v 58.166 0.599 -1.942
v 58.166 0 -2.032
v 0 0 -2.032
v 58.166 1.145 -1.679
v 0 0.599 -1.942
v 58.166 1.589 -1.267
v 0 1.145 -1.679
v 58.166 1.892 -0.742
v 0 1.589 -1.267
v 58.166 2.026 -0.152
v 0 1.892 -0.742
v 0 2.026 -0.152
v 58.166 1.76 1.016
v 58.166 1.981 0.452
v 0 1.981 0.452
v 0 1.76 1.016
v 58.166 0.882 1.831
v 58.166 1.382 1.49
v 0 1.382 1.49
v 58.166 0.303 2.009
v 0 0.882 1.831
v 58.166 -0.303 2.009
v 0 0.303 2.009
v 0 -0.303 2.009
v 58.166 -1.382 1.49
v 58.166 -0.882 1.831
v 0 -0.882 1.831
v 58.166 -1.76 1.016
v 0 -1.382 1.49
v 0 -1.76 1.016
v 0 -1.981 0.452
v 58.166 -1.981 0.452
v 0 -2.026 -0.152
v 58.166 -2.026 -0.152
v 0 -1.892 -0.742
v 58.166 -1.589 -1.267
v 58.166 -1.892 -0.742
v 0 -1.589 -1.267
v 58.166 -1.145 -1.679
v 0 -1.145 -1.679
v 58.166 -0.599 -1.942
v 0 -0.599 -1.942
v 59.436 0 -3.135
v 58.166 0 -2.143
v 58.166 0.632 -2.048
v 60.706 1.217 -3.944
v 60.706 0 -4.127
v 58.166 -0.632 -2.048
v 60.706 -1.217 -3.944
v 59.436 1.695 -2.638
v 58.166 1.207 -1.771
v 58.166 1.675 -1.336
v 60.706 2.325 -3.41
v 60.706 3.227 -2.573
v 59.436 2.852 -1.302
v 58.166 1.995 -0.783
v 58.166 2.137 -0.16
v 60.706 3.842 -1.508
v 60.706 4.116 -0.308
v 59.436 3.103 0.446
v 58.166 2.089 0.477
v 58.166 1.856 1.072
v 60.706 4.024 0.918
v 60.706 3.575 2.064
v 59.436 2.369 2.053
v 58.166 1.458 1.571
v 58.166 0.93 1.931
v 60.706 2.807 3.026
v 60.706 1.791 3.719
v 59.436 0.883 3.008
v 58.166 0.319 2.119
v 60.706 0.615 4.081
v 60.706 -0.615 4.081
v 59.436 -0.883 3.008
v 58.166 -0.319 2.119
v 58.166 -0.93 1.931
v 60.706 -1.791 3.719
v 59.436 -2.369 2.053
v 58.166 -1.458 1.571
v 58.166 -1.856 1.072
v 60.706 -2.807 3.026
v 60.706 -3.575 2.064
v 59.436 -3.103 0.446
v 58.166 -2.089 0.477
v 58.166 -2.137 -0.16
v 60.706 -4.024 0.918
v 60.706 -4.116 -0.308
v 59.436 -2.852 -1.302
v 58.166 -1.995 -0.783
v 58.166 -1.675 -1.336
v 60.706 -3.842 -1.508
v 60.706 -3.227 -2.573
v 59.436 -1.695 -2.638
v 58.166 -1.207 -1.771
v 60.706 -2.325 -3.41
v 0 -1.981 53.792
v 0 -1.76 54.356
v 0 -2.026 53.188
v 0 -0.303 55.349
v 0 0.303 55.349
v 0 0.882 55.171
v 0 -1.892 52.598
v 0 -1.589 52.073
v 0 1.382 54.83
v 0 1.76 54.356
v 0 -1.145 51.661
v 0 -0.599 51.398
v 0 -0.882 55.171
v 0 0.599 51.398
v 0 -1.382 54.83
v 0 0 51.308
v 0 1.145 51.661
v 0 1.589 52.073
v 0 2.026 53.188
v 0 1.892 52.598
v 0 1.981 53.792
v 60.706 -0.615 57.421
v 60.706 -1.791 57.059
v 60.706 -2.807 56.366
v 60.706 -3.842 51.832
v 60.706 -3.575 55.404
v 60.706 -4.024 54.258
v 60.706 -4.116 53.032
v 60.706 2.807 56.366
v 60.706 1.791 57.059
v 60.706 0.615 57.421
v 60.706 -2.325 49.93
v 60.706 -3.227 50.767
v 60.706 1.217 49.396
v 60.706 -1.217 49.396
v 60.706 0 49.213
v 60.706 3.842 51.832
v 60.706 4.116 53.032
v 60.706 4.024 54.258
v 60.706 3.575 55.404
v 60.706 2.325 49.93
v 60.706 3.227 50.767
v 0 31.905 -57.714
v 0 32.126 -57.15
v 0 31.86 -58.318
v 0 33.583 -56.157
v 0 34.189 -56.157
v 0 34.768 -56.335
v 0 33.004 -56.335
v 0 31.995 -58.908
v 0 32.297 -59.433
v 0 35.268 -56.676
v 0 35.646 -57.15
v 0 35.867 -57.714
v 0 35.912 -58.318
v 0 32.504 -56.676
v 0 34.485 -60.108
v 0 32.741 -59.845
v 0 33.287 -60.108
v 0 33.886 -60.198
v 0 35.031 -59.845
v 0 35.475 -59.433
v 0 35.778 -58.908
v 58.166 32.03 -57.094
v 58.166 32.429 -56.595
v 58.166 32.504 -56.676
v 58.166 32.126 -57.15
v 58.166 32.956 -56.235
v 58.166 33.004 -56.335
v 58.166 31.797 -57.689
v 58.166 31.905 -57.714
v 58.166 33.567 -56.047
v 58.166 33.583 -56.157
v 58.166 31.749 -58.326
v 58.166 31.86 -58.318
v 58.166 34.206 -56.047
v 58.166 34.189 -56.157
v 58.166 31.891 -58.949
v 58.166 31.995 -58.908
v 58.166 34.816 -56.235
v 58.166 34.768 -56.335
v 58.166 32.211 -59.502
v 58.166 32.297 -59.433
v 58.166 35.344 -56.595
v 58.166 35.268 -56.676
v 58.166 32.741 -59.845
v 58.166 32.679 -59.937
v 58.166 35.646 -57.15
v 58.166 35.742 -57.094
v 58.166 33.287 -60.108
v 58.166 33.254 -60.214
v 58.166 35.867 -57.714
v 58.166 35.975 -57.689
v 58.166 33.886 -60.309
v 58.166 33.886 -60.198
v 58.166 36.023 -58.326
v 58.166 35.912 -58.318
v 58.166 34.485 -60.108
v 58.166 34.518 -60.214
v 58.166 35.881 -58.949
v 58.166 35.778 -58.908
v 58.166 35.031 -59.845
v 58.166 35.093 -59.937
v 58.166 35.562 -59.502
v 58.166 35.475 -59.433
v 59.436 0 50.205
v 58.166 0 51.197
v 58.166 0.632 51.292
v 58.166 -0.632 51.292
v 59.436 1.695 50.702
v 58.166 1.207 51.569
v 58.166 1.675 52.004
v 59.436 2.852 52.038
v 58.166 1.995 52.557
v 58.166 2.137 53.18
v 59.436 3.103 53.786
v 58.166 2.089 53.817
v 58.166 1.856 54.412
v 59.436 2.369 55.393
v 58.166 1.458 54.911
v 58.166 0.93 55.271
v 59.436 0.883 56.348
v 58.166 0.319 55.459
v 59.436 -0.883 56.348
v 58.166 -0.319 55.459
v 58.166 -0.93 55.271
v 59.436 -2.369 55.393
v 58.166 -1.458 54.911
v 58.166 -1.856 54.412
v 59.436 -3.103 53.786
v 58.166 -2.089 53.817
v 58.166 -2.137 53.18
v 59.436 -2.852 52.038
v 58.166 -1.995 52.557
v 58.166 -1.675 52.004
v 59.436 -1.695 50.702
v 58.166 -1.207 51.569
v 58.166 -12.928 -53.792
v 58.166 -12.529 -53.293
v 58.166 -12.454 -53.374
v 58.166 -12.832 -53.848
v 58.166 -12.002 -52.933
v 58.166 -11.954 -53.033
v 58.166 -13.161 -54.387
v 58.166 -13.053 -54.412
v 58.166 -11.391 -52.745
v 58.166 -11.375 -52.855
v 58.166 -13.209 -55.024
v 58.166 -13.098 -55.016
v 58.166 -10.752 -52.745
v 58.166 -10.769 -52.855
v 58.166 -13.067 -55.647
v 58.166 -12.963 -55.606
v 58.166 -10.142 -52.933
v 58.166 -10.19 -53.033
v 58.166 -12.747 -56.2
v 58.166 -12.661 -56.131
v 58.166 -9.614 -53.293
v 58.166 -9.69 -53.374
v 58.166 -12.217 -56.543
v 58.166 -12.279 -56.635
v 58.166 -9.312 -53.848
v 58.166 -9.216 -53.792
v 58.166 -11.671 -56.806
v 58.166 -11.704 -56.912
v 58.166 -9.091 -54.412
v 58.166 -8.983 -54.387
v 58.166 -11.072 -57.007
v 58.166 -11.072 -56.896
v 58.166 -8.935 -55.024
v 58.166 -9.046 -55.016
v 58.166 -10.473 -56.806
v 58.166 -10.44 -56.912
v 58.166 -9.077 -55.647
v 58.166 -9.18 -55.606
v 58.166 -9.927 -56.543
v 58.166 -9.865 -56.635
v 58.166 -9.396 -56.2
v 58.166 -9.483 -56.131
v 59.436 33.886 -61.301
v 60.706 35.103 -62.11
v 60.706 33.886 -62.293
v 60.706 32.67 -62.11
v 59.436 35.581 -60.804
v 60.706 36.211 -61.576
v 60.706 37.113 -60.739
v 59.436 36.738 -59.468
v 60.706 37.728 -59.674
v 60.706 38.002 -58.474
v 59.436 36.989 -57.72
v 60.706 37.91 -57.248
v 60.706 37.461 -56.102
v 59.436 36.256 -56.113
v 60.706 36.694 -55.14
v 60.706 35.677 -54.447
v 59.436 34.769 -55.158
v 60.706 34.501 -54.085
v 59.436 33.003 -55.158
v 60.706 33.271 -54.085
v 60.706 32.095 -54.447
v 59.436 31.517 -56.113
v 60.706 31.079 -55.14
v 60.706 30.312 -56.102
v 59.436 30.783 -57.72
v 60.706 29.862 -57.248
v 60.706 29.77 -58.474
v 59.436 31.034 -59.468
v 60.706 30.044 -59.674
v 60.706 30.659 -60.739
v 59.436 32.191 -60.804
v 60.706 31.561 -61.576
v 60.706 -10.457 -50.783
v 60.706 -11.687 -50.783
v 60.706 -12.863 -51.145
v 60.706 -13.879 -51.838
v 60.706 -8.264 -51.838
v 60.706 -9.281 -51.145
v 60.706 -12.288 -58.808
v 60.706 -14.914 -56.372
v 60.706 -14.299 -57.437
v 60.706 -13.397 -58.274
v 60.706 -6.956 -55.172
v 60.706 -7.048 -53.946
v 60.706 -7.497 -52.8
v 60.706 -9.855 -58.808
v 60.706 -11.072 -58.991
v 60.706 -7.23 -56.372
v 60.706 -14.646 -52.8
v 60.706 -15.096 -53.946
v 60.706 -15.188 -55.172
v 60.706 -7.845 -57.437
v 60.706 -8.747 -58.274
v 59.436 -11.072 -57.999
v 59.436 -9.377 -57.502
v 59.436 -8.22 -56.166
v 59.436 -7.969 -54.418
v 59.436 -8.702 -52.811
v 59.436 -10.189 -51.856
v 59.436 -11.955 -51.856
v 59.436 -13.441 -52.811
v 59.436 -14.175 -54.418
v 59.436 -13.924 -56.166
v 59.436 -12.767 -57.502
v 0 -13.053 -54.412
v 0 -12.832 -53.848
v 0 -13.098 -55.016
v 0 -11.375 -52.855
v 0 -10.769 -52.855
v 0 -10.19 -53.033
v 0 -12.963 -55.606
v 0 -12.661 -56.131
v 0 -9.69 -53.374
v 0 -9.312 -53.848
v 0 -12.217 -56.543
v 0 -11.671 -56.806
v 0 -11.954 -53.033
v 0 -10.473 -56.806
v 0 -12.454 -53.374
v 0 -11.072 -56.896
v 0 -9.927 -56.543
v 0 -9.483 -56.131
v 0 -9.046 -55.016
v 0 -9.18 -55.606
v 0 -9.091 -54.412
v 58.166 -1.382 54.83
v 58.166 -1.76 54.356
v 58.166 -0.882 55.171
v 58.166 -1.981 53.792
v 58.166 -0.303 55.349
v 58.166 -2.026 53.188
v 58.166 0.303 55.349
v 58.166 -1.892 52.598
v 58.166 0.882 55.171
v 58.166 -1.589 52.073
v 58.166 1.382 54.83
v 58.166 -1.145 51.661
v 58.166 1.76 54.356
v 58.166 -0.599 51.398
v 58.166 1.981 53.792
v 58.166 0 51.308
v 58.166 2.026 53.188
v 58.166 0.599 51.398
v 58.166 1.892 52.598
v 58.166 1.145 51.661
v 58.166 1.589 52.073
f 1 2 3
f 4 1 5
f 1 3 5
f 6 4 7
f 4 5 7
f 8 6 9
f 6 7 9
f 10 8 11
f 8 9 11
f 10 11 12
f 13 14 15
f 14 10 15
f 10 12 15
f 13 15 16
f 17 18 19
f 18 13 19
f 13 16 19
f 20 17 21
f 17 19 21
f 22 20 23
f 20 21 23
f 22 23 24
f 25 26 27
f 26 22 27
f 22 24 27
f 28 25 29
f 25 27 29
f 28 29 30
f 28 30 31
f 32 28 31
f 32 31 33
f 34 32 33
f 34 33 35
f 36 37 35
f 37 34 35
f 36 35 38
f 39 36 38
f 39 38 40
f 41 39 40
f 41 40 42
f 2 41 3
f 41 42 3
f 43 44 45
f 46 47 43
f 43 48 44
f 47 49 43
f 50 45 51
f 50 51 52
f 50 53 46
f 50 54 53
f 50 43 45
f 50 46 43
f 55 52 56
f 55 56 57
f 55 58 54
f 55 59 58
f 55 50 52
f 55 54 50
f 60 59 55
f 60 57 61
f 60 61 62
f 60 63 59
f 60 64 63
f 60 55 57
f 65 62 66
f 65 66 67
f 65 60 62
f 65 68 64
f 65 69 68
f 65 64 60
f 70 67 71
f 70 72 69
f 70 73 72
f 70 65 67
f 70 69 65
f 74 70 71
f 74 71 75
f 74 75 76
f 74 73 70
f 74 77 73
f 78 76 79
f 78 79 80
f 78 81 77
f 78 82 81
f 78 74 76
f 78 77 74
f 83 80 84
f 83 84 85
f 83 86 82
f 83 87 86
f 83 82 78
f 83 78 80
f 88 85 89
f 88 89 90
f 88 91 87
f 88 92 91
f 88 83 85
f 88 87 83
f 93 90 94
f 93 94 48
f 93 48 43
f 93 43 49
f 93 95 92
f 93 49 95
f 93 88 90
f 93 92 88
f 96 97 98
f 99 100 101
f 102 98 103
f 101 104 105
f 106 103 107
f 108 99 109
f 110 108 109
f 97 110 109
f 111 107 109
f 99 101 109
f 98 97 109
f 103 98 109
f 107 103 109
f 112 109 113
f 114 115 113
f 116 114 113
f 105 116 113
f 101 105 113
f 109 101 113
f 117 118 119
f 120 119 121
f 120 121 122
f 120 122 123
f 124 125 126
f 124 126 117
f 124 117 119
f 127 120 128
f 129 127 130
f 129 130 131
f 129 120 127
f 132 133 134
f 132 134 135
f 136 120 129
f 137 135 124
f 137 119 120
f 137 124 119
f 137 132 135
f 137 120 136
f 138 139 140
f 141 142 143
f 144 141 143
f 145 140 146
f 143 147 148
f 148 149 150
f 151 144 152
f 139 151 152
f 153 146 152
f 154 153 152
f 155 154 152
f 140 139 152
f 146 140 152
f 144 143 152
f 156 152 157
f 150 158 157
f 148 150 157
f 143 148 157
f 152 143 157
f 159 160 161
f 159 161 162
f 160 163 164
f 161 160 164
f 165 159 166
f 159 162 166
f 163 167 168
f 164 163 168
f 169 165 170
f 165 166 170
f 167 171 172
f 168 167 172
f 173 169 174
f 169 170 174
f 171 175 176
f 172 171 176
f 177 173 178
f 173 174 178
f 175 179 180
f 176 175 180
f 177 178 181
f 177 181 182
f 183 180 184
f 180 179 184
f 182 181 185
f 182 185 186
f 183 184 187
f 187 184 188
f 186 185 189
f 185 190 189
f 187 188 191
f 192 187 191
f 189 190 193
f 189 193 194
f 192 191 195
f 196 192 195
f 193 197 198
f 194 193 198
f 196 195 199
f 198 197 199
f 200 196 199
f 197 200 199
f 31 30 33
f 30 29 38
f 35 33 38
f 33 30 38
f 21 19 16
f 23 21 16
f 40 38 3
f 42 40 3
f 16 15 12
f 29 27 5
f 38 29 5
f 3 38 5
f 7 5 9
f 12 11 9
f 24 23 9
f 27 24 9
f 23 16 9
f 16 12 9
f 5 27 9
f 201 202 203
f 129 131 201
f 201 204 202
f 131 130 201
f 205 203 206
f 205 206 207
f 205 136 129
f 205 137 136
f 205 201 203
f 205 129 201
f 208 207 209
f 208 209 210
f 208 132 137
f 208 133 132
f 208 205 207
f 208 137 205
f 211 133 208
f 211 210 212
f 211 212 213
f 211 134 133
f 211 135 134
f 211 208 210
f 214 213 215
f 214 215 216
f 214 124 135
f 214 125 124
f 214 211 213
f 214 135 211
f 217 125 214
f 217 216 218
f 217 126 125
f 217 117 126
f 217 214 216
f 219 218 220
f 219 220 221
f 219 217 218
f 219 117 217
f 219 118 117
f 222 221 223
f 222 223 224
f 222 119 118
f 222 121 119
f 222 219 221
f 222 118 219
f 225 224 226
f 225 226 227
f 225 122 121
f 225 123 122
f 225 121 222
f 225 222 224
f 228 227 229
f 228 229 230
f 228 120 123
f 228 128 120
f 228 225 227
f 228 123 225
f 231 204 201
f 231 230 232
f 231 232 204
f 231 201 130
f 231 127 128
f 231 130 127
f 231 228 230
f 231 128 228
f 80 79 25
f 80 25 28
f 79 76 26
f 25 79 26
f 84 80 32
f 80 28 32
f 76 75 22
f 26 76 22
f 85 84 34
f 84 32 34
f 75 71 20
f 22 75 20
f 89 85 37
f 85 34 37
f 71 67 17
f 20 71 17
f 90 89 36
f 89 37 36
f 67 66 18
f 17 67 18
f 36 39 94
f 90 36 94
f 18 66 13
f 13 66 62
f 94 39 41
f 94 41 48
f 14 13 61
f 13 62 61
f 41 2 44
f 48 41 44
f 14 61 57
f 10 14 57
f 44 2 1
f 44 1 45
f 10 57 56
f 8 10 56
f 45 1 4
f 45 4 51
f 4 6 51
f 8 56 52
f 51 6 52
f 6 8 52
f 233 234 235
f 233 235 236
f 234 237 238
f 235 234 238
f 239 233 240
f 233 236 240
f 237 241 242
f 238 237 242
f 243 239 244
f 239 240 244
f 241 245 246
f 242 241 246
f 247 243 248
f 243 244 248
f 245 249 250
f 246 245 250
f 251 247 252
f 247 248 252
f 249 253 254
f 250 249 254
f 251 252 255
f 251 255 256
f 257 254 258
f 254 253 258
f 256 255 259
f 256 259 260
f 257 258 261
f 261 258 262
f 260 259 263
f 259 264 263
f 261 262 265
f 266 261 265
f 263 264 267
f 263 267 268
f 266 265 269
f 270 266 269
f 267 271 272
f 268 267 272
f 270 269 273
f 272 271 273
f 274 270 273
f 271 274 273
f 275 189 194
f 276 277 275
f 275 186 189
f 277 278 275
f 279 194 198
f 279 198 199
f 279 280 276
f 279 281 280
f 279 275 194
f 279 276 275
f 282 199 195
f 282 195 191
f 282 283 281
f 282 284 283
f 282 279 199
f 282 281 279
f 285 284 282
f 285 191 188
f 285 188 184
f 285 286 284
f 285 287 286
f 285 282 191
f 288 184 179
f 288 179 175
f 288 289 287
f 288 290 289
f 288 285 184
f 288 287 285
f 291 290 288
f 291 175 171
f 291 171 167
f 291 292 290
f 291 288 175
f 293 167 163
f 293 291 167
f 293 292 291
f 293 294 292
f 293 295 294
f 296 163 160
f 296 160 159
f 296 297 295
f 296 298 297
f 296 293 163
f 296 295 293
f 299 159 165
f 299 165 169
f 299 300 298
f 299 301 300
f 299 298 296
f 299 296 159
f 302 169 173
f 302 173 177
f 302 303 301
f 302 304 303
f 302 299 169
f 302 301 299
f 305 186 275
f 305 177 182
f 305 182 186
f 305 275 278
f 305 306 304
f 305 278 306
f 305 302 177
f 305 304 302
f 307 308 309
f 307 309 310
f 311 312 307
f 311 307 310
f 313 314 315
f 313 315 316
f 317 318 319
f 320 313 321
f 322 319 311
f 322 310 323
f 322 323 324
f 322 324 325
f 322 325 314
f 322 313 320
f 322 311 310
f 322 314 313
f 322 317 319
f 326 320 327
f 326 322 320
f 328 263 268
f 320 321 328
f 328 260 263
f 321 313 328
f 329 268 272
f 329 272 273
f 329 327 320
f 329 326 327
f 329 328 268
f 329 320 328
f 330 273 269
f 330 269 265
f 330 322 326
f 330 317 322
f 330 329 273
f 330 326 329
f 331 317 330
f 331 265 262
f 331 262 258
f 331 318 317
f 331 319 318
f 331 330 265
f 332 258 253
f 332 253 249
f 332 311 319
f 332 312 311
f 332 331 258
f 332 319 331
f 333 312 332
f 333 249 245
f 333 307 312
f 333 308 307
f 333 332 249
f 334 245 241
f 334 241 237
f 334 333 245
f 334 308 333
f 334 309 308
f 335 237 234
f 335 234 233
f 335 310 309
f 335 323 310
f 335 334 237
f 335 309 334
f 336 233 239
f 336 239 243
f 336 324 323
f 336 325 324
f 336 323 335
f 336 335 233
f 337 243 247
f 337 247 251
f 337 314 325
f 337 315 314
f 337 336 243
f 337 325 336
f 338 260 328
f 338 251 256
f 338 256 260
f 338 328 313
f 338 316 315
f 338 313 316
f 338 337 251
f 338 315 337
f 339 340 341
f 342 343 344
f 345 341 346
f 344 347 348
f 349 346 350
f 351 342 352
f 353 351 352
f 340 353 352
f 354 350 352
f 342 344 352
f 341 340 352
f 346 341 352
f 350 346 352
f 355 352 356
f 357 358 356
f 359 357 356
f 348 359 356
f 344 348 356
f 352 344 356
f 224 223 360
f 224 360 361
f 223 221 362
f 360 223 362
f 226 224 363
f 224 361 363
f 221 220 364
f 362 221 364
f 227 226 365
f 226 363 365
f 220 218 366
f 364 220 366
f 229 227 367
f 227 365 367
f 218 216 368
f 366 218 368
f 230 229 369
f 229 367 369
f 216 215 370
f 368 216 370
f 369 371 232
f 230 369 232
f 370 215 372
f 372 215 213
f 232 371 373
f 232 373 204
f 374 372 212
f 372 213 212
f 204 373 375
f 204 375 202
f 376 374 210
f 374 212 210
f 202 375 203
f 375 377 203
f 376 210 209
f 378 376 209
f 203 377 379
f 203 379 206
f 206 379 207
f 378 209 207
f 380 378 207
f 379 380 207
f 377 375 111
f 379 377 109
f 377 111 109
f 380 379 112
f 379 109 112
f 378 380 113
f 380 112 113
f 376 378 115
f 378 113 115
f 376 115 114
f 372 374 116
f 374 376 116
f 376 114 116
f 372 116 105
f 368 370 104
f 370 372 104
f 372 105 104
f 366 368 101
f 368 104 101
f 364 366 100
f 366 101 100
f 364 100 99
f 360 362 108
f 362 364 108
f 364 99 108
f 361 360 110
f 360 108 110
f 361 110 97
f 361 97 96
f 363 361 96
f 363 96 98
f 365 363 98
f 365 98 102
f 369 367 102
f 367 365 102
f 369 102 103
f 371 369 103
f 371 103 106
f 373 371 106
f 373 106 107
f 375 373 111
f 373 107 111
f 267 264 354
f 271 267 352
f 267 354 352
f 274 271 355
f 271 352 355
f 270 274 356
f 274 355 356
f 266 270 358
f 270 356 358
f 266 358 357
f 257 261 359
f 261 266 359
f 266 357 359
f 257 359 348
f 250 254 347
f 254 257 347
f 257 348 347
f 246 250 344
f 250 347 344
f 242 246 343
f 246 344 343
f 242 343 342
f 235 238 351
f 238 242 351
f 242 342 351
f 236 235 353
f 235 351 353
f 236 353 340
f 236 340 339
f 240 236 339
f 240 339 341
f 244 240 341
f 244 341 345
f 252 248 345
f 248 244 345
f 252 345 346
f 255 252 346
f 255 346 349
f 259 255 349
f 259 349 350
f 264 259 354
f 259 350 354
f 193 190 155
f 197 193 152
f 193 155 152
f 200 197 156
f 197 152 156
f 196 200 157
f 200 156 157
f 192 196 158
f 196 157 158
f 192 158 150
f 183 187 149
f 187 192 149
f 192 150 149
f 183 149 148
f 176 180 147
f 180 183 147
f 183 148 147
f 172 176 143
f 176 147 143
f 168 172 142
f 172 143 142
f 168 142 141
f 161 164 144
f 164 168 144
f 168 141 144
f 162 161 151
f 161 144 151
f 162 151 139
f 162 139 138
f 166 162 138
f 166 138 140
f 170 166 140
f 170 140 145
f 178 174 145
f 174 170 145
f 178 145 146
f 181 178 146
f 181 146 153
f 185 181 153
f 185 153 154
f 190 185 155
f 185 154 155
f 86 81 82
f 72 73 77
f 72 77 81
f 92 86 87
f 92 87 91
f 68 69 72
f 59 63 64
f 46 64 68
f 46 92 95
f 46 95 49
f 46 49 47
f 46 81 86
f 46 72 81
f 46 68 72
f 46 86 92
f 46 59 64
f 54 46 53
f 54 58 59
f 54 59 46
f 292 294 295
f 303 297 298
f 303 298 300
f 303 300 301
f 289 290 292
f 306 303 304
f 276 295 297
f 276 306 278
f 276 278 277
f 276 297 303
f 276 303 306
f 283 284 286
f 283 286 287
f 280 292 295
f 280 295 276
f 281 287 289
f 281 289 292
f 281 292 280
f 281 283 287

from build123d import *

# Parameters (mm, degrees)
SKETCH2_R                     = 2.032
BOSS_EXTRUDE1_DEPTH           = 60.706
BOSS_EXTRUDE1_2_DEPTH         = 60.706
BOSS_EXTRUDE1_3_DEPTH         = 60.706
BOSS_EXTRUDE1_4_DEPTH         = 60.706
SKETCH3_R                     = 4.1275
BOSS_EXTRUDE2_DEPTH           = 2.54
BOSS_EXTRUDE2_DRAFT           = -38
BOSS_EXTRUDE2_PROFILE_2_DEPTH = 2.54
BOSS_EXTRUDE2_PROFILE_2_DRAFT = -38
BOSS_EXTRUDE2_PROFILE_3_DEPTH = 2.54
BOSS_EXTRUDE2_PROFILE_3_DRAFT = -38
BOSS_EXTRUDE2_PROFILE_4_DEPTH = 2.54
BOSS_EXTRUDE2_PROFILE_4_DRAFT = -38


with BuildPart() as part:
    # Sketch2 → Boss-Extrude1 (new body)
    with BuildSketch(Plane(origin=(0, 0, 0), x_dir=(0, 0, -1), z_dir=(1, 0, 0))):
        with Locations((-53.34, 0)):
            Circle(SKETCH2_R)
    extrude(amount=BOSS_EXTRUDE1_DEPTH)


with BuildPart() as body_2:
    # Sketch2 → Boss-Extrude1 2 (new body)
    with BuildSketch(Plane(origin=(0, 0, 0), x_dir=(0, 0, -1), z_dir=(1, 0, 0))):
        Circle(SKETCH2_R)
    extrude(amount=BOSS_EXTRUDE1_2_DEPTH)


with BuildPart() as body_3:
    # Sketch2 → Boss-Extrude1 3 (new body)
    with BuildSketch(Plane(origin=(0, 0, 0), x_dir=(0, 0, -1), z_dir=(1, 0, 0))):
        with Locations((54.864, -11.07186)):
            Circle(SKETCH2_R)
    extrude(amount=BOSS_EXTRUDE1_3_DEPTH)


with BuildPart() as body_4:
    # Sketch2 → Boss-Extrude1 4 (new body)
    with BuildSketch(Plane(origin=(0, 0, 0), x_dir=(0, 0, -1), z_dir=(1, 0, 0))):
        with Locations((58.166, 33.88614)):
            Circle(SKETCH2_R)
    extrude(amount=BOSS_EXTRUDE1_4_DEPTH)


with BuildPart() as boss_extrude2_tool:
    # Sketch3 → Boss-Extrude2 (with draft: the straight prism first)
    with BuildSketch(Plane(origin=(60.706, 0, 0), x_dir=(0, 0, -1), z_dir=(1, 0, 0))):
        with Locations((-53.34, 0)):
            Circle(SKETCH3_R)
    extrude(amount=-BOSS_EXTRUDE2_DEPTH)
    # Boss-Extrude2: the draft: its side faces are tilted about the plane it starts from
    boss_extrude2_sides = [boss_extrude2_tool.faces().sort_by_distance(p)[0] for p in [
        (59.436, 0, 57.4675),
    ]]
    draft(boss_extrude2_sides, Plane(origin=(60.706, 0, 0), x_dir=(0, 0, -1), z_dir=(1, 0, 0)), BOSS_EXTRUDE2_DRAFT)


with BuildPart() as part_1:
    add(part.part)

    # Boss-Extrude2: add boss_extrude2_tool
    add(boss_extrude2_tool.part)

    add(body_2.part)  # Boss-Extrude2 merges body 2

    add(body_3.part)  # Boss-Extrude2 merges body 3

    add(body_4.part)  # Boss-Extrude2 merges body 4


with BuildPart() as boss_extrude2_profile_2_tool:
    # Sketch3 → Boss-Extrude2 profile 2 (with draft: the straight prism first)
    with BuildSketch(Plane(origin=(60.706, 0, 0), x_dir=(0, 0, -1), z_dir=(1, 0, 0))):
        Circle(SKETCH3_R)
    extrude(amount=-BOSS_EXTRUDE2_PROFILE_2_DEPTH)
    # Boss-Extrude2 profile 2: the draft: its side faces are tilted about the plane it starts from
    boss_extrude2_profile_2_sides = [boss_extrude2_profile_2_tool.faces().sort_by_distance(p)[0] for p in [
        (59.436, 0, 4.1275),
    ]]
    draft(boss_extrude2_profile_2_sides, Plane(origin=(60.706, 0, 0), x_dir=(0, 0, -1), z_dir=(1, 0, 0)), BOSS_EXTRUDE2_PROFILE_2_DRAFT)


with BuildPart() as part_2:
    add(part_1.part)

    # Boss-Extrude2 profile 2: add boss_extrude2_profile_2_tool
    add(boss_extrude2_profile_2_tool.part)


with BuildPart() as boss_extrude2_profile_3_tool:
    # Sketch3 → Boss-Extrude2 profile 3 (with draft: the straight prism first)
    with BuildSketch(Plane(origin=(60.706, 0, 0), x_dir=(0, 0, -1), z_dir=(1, 0, 0))):
        with Locations((58.166, 33.88614)):
            Circle(SKETCH3_R)
    extrude(amount=-BOSS_EXTRUDE2_PROFILE_3_DEPTH)
    # Boss-Extrude2 profile 3: the draft: its side faces are tilted about the plane it starts from
    boss_extrude2_profile_3_sides = [boss_extrude2_profile_3_tool.faces().sort_by_distance(p)[0] for p in [
        (59.436, 33.88614, -54.0385),
    ]]
    draft(boss_extrude2_profile_3_sides, Plane(origin=(60.706, 0, 0), x_dir=(0, 0, -1), z_dir=(1, 0, 0)), BOSS_EXTRUDE2_PROFILE_3_DRAFT)


with BuildPart() as part_3:
    add(part_2.part)

    # Boss-Extrude2 profile 3: add boss_extrude2_profile_3_tool
    add(boss_extrude2_profile_3_tool.part)


with BuildPart() as boss_extrude2_profile_4_tool:
    # Sketch3 → Boss-Extrude2 profile 4 (with draft: the straight prism first)
    with BuildSketch(Plane(origin=(60.706, 0, 0), x_dir=(0, 0, -1), z_dir=(1, 0, 0))):
        with Locations((54.864, -11.07186)):
            Circle(SKETCH3_R)
    extrude(amount=-BOSS_EXTRUDE2_PROFILE_4_DEPTH)
    # Boss-Extrude2 profile 4: the draft: its side faces are tilted about the plane it starts from
    boss_extrude2_profile_4_sides = [boss_extrude2_profile_4_tool.faces().sort_by_distance(p)[0] for p in [
        (59.436, -11.07186, -50.7365),
    ]]
    draft(boss_extrude2_profile_4_sides, Plane(origin=(60.706, 0, 0), x_dir=(0, 0, -1), z_dir=(1, 0, 0)), BOSS_EXTRUDE2_PROFILE_4_DRAFT)


with BuildPart() as part_4:
    add(part_3.part)

    # Boss-Extrude2 profile 4: add boss_extrude2_profile_4_tool
    add(boss_extrude2_profile_4_tool.part)


solid = part_4.part
